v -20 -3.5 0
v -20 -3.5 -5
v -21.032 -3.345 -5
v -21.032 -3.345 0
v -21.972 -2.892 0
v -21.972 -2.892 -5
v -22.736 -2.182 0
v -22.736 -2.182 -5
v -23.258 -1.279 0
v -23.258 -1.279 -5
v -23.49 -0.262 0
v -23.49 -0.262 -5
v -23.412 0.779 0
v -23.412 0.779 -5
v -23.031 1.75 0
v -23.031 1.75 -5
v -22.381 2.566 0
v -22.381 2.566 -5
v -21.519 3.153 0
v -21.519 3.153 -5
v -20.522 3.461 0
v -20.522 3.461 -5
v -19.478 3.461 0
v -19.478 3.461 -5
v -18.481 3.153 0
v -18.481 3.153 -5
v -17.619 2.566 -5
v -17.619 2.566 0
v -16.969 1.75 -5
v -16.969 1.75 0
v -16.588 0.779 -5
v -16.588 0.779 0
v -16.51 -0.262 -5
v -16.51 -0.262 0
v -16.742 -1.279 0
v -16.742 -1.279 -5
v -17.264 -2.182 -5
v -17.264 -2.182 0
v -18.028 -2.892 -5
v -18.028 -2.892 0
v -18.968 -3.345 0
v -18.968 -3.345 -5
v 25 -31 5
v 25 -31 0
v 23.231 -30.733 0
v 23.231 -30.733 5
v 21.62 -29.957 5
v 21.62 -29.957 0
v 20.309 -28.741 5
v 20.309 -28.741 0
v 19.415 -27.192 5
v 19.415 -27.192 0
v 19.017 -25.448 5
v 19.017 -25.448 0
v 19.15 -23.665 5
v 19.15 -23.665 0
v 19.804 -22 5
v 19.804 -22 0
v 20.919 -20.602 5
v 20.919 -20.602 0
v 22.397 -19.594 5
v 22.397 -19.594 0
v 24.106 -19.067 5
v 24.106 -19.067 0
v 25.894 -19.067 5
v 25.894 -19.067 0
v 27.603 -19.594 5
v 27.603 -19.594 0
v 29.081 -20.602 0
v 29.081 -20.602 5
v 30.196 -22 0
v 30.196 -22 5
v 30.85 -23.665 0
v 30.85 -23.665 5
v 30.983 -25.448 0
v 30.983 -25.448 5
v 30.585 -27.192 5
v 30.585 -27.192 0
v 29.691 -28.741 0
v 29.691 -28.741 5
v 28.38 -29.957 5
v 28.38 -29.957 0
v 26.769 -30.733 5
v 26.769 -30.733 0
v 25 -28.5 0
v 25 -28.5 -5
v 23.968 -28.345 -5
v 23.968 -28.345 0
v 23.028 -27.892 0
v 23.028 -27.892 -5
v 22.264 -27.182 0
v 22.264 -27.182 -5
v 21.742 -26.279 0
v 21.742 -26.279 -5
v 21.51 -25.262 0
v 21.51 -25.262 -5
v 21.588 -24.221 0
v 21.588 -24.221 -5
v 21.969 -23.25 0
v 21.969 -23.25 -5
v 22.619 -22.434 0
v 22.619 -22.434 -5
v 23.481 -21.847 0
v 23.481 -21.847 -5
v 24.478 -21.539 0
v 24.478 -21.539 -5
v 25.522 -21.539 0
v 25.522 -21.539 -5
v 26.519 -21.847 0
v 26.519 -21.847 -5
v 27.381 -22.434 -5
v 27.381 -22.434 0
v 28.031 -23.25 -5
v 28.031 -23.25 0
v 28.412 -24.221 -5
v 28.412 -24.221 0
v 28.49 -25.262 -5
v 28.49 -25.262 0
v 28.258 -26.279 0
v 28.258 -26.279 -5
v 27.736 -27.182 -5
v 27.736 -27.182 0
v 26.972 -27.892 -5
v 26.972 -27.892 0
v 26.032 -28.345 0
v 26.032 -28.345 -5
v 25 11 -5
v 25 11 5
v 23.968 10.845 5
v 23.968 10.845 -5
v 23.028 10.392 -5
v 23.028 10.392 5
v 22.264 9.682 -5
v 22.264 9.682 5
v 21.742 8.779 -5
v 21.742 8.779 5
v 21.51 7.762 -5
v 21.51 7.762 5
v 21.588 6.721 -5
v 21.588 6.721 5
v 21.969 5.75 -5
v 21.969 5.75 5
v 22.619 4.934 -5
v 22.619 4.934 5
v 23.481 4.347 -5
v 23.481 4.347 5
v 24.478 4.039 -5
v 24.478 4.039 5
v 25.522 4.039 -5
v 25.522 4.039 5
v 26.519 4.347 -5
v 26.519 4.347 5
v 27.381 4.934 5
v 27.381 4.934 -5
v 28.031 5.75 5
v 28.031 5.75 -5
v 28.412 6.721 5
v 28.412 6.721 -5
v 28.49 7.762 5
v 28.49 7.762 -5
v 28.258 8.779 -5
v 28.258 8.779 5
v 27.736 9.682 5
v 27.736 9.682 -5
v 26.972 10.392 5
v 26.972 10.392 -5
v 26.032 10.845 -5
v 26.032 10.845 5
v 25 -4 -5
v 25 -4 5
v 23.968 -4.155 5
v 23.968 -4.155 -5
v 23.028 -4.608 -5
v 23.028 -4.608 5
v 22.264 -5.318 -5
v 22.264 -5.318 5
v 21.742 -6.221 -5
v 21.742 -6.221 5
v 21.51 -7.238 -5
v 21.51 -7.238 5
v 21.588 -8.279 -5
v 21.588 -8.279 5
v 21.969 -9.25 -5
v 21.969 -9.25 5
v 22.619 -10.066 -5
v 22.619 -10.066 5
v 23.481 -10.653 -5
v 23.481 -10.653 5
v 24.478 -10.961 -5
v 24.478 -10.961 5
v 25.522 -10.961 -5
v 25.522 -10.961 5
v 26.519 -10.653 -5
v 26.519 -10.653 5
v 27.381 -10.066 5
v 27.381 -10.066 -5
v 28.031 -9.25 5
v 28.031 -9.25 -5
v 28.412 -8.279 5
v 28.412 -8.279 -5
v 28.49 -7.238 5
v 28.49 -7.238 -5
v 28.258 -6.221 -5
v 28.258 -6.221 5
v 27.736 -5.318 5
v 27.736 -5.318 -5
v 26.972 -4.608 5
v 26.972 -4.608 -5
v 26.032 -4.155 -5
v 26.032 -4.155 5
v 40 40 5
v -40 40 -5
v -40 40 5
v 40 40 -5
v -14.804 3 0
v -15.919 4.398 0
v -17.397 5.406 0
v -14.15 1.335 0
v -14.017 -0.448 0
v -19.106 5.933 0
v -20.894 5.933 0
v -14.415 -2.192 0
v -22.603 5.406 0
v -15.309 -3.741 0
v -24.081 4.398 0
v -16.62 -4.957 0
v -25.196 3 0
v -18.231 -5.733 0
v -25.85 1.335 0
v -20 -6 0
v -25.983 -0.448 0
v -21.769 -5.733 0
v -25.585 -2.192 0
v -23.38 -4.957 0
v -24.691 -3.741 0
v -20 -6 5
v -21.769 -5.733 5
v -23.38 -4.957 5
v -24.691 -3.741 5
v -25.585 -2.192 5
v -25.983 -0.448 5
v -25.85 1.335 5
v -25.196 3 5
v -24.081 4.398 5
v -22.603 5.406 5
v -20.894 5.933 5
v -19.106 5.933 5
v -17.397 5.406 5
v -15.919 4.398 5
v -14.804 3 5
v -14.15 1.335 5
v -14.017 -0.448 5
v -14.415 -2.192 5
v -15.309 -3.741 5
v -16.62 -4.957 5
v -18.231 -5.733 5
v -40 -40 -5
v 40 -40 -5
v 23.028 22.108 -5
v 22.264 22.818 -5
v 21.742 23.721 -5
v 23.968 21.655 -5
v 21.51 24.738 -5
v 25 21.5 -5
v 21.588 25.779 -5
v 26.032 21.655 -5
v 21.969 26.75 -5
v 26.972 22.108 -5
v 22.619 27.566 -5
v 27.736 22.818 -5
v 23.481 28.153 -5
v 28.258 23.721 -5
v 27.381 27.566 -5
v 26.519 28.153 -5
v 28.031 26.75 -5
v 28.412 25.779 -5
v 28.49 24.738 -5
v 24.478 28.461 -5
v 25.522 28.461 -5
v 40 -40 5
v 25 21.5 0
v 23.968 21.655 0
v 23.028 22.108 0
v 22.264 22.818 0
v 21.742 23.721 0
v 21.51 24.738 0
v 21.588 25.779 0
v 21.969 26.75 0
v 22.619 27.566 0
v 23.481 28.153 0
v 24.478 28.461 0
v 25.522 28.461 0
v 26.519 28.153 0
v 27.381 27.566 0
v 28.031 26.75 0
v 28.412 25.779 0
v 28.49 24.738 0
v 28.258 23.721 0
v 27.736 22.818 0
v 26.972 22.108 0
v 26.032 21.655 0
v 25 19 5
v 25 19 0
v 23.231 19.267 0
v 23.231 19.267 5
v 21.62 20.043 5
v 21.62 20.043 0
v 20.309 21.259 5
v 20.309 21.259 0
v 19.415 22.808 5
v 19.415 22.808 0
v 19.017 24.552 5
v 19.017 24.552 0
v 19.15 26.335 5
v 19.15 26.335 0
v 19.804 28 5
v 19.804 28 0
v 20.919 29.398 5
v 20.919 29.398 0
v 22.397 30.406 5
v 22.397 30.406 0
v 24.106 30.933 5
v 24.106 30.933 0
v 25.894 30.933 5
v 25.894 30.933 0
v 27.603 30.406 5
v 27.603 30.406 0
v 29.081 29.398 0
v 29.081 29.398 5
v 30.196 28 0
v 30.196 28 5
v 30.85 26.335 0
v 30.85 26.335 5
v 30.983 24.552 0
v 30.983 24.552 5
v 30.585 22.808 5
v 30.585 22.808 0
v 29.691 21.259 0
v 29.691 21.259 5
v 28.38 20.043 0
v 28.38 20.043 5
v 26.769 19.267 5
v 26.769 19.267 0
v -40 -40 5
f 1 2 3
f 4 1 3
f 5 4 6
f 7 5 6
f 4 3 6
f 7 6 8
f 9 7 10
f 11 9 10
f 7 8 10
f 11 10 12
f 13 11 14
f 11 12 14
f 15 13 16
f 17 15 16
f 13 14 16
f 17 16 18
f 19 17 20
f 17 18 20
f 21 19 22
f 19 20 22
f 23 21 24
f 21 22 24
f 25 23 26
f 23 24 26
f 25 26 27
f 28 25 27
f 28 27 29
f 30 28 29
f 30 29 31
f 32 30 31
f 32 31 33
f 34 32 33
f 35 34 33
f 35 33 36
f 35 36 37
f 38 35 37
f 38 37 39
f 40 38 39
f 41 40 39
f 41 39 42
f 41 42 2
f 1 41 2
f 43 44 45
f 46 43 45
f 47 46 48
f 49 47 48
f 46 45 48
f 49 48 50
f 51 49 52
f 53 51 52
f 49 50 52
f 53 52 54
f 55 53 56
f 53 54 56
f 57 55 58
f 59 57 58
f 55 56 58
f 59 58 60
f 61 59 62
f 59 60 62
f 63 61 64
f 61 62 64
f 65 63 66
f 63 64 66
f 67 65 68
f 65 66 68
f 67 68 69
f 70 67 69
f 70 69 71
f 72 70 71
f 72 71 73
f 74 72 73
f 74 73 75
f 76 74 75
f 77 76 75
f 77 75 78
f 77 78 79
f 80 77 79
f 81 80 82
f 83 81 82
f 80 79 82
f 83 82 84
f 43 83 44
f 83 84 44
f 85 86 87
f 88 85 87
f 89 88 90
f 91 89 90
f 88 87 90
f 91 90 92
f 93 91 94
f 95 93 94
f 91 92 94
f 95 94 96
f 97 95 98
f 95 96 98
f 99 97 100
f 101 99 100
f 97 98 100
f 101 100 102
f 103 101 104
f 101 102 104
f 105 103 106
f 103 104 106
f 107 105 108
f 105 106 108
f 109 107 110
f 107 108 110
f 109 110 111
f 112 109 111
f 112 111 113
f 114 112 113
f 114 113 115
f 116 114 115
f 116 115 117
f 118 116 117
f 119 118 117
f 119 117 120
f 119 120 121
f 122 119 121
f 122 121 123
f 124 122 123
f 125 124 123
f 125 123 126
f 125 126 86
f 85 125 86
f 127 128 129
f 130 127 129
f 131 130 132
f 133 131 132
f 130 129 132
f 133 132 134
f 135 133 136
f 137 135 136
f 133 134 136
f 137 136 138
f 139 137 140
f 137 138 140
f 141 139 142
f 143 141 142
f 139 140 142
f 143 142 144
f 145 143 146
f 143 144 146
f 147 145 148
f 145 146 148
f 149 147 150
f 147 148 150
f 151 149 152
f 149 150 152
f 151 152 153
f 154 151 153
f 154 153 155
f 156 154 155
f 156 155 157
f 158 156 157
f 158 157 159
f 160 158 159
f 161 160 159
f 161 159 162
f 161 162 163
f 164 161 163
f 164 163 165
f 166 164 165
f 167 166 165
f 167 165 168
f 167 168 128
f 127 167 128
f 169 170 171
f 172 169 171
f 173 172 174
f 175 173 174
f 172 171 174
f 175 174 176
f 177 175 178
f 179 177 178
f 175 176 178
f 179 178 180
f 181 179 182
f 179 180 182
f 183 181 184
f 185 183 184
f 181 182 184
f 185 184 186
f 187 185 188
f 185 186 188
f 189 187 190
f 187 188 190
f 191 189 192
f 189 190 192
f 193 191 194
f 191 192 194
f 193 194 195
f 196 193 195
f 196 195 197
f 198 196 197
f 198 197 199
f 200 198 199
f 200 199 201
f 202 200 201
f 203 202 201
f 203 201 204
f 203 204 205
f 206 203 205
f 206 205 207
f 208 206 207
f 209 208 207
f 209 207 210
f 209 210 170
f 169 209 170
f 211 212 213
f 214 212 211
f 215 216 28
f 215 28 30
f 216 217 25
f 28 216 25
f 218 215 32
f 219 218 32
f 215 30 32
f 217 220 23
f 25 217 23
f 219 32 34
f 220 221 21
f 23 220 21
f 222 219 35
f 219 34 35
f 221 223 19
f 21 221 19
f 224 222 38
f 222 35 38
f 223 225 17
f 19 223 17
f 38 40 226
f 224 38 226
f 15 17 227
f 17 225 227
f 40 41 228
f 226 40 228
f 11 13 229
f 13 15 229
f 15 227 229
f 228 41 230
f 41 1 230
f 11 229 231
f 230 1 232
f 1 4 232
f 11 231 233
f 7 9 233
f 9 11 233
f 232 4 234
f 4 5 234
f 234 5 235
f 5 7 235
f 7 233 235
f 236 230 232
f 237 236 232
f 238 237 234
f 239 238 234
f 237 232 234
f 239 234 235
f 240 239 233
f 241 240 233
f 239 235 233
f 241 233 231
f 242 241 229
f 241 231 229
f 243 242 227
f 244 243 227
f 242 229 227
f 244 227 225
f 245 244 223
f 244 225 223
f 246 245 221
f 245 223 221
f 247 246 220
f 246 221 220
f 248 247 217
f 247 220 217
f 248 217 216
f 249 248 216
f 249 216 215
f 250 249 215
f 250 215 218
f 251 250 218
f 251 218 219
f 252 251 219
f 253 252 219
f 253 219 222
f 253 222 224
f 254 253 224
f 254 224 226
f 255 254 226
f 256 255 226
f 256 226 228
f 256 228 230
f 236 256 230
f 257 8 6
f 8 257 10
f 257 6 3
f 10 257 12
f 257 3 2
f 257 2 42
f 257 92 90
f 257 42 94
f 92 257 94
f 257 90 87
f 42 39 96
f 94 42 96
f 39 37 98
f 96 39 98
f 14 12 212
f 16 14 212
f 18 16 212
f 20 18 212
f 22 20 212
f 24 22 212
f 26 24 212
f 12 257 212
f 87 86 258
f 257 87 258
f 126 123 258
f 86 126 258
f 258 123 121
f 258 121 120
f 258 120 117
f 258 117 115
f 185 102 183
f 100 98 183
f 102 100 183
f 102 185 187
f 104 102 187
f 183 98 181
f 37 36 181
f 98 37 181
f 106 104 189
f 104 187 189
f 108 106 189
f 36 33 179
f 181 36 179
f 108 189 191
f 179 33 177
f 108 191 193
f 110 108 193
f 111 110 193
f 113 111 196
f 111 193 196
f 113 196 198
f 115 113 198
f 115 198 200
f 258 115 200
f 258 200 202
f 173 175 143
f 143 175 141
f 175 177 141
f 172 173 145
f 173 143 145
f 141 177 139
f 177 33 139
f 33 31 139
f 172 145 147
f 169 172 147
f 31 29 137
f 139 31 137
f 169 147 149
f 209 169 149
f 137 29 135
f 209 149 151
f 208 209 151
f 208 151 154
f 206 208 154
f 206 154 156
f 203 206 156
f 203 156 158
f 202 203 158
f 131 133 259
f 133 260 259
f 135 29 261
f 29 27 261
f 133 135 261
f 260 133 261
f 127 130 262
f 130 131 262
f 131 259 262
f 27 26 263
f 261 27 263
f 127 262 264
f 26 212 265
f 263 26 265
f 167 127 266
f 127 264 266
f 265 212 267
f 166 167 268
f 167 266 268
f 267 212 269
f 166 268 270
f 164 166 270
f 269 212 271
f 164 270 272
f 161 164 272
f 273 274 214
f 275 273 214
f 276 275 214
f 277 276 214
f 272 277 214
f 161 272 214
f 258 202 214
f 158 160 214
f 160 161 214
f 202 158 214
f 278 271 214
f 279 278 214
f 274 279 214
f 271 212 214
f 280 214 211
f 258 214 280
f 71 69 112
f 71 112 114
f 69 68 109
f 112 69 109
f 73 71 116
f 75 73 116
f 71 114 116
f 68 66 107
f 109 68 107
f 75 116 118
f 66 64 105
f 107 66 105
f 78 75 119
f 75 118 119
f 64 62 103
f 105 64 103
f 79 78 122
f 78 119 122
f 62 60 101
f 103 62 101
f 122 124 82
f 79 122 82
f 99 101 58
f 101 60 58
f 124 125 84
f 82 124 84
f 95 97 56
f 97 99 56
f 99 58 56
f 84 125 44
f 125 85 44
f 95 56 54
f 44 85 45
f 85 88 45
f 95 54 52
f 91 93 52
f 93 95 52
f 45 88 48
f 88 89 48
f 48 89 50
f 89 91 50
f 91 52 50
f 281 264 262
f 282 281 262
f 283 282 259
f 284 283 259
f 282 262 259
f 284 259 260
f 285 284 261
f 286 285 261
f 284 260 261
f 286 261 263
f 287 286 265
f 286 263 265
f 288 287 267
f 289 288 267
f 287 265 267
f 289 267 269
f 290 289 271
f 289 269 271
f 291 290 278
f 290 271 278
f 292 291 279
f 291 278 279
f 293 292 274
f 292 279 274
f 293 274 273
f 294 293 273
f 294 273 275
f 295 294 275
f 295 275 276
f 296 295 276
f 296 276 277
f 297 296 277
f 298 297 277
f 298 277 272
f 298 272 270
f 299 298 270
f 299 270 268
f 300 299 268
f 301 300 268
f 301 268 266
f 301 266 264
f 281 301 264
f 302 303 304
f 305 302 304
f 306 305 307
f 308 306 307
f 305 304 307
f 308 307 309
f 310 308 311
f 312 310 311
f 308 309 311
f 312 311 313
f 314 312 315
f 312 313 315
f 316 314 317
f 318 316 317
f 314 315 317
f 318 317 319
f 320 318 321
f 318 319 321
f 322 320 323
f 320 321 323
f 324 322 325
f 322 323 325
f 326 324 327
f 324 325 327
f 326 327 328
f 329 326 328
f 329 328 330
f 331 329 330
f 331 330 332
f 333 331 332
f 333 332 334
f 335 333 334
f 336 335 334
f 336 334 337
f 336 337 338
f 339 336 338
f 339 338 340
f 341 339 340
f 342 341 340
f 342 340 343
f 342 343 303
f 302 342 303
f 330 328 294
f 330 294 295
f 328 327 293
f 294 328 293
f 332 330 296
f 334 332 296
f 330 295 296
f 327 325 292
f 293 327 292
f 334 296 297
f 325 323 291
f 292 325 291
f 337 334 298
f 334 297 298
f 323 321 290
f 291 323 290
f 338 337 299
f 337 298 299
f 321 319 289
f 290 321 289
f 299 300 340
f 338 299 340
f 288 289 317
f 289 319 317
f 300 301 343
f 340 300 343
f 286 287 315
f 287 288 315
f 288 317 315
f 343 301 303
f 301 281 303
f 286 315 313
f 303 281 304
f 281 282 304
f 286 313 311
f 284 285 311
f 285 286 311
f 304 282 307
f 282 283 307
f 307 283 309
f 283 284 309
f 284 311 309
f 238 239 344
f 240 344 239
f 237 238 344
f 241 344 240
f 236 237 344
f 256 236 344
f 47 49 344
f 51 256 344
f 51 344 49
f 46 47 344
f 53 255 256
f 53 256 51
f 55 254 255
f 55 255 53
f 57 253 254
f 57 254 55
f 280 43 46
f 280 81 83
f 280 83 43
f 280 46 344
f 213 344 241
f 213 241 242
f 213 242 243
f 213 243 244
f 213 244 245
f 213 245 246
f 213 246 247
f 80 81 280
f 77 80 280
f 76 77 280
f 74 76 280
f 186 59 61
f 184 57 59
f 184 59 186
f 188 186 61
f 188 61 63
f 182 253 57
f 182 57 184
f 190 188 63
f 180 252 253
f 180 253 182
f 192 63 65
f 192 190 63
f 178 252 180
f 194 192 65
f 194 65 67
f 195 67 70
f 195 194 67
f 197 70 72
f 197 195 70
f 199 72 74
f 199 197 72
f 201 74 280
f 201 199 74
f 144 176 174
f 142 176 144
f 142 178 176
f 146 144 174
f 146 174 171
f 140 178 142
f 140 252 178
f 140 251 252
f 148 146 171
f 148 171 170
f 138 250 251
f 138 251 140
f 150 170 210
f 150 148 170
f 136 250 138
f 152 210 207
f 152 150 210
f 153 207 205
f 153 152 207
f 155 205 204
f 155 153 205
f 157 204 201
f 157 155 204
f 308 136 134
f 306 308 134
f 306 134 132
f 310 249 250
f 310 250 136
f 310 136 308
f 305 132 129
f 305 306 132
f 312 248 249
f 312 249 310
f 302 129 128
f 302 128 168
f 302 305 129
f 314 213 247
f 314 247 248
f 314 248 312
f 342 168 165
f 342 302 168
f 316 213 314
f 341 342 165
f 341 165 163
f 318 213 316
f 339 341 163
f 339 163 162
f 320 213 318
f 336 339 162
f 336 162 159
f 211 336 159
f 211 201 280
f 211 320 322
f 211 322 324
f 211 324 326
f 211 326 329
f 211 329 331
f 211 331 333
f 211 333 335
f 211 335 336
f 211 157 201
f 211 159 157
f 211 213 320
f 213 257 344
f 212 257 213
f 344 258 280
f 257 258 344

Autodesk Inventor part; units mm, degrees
ref_plane "YZ Plane" through (0, 0, 0) normal (1, 0, 0) x (0, 1, 0)
ref_plane "XZ Plane" through (0, 0, 0) normal (0, 1, 0) x (-1, 0, 0)
ref_plane "XY Plane" through (0, 0, 0) normal (0, 0, 1) x (1, 0, 0)
sketch "Sketch1" plane through (0, 0, 0) normal (0, 0, 1) x (1, 0, 0)
  line L0 (40, -40) -> (-40, -40)
  line L1 (-40, -40) -> (-40, 40)
  line L2 (-40, 40) -> (40, 40)
  line L3 (40, 40) -> (40, -40)
  line L4 (40, -40) -> (-40, 40) construction
  line L5 (-40, -40) -> (40, 40) construction
  point P0 (0, 0)
  dimension "d1" = 80
  dimension "d2" = 80
extrude "Extrusion1" add sketch "Sketch1" along normal mid plane 10
sketch "Sketch2" plane through (0, 0, 5) normal (0, 0, 1) x (1, 0, 0)
  line L0 (-40, 40) -> (-40, -40) projected
  line L1 (40, 40) -> (-40, 40) projected
  line L2 (40, -40) -> (40, 40) projected
  point P0 (0, 0)
  point P1 (25, 25)
  point P2 (25, -25)
  point P3 (-20, 0)
  point P4 (-40, 0)
  dimension "d27" = 15
  dimension "d31" = 15
  dimension "d32" = 50
  dimension "d33" = 40
  dimension "d34" = 20
hole "Hole1" at (25, 25, 5) at (25, -25, 5) at (-20, 0, 5) direction (0, 0, -1) diameter 7 depth 17.1 tip angle 118 counterbore diameter 12 counterbore depth 5
sketch "Sketch3" plane through (0, 0, -5) normal (0, 0, -1) x (-1, 0, 0)
  line L0 (-40, -40) -> (40, -40) projected
  line L1 (56, 0) -> (-56, 0) construction
  circle A0 centre (-25, 25) radius 3.5 projected
  point P0 (0, 0)
  point P1 (-25, -7.5)
  point P2 (-25, 7.5)
  dimension "d28" = 0
  dimension "d29" = 15
  dimension "d30" = 7.5
hole "Hole2" at (25, -7.5, -5) at (25, 7.5, -5) direction (0, 0, 1) diameter 7 depth 17.1 tip angle 118
properties part number "HCMUTE-CDT23-DE_GA_LOADCELL" material "Stainless Steel"
